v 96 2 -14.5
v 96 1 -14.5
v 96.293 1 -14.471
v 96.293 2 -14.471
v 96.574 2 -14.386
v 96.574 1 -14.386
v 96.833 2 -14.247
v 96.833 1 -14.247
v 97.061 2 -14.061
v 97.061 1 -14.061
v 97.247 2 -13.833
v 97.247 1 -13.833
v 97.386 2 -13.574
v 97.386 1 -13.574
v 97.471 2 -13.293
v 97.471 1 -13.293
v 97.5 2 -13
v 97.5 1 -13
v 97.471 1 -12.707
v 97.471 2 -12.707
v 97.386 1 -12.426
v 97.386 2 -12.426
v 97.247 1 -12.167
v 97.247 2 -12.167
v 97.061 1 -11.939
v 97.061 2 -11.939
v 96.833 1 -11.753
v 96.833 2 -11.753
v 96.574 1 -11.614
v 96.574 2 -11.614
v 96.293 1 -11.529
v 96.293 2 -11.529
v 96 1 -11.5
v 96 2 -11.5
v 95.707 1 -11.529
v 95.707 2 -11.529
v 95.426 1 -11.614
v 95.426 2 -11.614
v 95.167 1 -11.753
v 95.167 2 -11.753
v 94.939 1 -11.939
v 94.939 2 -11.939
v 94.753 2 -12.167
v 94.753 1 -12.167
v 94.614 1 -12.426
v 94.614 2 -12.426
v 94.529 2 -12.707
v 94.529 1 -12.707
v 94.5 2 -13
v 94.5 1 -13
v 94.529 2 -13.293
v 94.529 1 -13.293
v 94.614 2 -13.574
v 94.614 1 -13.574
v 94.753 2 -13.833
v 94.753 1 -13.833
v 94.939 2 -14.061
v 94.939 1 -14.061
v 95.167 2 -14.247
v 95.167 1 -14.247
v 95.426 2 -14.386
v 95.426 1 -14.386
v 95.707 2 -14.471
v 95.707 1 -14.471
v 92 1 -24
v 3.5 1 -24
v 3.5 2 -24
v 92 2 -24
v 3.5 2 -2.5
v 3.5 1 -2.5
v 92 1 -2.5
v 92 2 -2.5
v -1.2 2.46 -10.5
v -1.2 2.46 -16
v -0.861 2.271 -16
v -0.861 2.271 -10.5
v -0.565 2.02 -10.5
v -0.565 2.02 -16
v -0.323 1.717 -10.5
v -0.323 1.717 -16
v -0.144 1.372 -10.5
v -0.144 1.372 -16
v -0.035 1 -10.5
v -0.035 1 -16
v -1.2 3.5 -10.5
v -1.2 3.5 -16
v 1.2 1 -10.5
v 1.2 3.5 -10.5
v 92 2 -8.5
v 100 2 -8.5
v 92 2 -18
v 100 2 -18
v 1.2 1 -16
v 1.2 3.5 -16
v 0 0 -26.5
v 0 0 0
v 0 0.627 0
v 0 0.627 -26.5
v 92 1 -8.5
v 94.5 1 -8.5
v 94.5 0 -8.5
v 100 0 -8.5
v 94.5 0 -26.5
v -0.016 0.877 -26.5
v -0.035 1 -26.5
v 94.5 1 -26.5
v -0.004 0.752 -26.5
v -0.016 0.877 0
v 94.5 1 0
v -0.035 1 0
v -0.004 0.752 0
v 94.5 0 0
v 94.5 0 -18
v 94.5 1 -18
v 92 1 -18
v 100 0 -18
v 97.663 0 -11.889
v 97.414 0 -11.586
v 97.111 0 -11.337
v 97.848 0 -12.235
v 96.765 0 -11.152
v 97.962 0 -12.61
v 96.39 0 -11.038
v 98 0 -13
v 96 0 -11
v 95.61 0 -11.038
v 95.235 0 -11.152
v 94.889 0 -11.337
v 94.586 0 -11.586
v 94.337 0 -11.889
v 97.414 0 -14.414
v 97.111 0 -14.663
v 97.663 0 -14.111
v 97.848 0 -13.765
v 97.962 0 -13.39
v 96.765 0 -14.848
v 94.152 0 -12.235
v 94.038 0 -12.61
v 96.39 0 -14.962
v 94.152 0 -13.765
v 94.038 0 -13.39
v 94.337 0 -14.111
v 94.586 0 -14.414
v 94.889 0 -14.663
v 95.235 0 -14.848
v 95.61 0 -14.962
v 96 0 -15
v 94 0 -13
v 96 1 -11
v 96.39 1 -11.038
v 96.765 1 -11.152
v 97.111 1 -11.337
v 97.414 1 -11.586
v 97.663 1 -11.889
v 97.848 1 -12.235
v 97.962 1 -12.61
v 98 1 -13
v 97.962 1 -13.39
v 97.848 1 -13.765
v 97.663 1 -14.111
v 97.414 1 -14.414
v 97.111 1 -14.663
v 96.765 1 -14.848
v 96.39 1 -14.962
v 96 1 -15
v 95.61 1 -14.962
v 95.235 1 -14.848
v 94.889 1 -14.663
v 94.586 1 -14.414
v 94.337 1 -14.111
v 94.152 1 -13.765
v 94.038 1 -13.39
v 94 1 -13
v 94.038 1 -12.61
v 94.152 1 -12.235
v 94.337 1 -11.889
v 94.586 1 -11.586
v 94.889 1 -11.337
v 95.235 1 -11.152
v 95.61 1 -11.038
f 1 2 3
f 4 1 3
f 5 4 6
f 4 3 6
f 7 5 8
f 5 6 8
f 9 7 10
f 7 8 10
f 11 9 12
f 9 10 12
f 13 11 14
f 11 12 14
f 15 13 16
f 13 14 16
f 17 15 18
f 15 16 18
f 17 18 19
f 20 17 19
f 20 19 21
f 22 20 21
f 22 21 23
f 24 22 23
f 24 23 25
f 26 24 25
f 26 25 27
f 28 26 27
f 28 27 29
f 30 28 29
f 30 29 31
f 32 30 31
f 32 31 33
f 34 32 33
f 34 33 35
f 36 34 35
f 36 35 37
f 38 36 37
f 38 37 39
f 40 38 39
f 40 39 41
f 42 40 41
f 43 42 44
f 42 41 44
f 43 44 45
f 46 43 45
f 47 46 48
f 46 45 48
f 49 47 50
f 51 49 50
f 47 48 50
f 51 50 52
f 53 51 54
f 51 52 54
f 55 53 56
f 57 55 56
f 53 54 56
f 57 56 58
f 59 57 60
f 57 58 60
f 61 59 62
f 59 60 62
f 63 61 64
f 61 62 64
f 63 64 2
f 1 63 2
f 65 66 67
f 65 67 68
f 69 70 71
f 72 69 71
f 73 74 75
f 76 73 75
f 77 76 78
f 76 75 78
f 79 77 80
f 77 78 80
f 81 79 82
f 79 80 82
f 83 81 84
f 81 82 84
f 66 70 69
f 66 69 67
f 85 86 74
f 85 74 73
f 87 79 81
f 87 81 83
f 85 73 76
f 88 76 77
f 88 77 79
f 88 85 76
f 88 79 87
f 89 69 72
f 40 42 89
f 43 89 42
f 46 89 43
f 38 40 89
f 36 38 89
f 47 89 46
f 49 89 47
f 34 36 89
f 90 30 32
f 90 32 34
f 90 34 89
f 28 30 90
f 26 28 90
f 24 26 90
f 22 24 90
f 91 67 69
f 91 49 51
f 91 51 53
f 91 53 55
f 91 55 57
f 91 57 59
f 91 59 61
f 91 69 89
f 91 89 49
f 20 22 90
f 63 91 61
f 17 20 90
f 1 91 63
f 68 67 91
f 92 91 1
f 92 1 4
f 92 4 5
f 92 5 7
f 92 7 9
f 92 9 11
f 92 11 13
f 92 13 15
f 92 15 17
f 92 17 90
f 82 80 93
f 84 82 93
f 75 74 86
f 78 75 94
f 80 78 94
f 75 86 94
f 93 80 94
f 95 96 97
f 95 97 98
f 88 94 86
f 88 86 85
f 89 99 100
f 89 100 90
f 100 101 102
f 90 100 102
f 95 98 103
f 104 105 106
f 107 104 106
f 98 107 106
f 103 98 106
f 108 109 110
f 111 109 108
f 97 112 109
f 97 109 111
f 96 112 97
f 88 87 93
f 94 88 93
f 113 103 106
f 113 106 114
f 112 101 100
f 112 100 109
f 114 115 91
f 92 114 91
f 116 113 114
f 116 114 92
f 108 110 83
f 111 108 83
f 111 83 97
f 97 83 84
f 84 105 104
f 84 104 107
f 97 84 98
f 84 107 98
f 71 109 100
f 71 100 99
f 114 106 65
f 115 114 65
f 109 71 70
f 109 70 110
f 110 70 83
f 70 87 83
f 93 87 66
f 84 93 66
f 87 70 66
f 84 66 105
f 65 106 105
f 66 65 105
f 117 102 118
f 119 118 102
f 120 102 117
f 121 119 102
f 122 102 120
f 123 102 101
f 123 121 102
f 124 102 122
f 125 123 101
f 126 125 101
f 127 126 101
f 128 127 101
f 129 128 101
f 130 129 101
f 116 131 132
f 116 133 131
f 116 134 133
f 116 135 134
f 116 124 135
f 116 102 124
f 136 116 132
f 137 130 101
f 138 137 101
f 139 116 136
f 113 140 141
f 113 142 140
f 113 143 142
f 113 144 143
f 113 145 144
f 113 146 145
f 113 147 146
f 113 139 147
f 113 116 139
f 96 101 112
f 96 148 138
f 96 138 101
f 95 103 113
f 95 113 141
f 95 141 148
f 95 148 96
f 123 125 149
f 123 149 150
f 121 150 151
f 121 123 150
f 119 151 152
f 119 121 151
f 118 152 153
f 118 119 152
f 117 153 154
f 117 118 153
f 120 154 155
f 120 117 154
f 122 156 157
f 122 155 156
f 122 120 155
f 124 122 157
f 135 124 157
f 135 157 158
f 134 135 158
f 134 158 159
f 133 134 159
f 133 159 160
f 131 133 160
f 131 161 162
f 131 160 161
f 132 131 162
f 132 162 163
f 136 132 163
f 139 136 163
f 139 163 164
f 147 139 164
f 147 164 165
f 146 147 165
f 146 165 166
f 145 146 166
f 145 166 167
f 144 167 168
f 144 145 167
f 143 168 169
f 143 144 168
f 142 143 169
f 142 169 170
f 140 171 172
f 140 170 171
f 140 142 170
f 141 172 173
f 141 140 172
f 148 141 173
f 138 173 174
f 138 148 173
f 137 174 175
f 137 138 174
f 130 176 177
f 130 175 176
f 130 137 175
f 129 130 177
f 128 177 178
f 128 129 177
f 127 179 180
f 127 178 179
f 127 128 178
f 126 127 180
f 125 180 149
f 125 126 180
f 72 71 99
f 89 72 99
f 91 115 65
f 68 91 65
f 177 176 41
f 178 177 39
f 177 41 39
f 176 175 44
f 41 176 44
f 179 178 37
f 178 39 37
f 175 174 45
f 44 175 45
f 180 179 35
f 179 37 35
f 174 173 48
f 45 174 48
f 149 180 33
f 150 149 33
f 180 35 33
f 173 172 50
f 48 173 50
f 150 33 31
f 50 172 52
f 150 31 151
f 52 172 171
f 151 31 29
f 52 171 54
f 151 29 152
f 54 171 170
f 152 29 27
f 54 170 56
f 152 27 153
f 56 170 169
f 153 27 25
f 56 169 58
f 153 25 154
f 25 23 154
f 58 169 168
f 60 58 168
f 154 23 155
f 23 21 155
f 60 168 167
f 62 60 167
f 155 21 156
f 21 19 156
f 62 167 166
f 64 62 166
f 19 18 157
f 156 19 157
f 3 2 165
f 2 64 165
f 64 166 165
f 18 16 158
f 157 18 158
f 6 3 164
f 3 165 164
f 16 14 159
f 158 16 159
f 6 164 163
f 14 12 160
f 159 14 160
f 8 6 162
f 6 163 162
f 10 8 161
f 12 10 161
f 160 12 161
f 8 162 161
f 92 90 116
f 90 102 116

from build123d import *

# Parameters (mm, degrees)
BOSS_EXTRUDE1_DEPTH     = 1
CUT_EXTRUDE3_DEPTH      = 104.456512603
CUT_EXTRUDE3_DEPTH_BACK = 104.456512603
SKETCH6_R               = 2
SKETCH2_W               = 88.5
SKETCH2_H               = 21.5
BOSS_EXTRUDE2_DEPTH     = 1
SKETCH3_W               = 1.2
SKETCH3_H               = 5.5
BOSS_EXTRUDE3_DEPTH     = 2.5
SKETCH7_W               = 8
SKETCH7_H               = 9.5
BOSS_EXTRUDE4_DEPTH     = 1
SKETCH8_R               = 1.5
CUT_EXTRUDE4_DEPTH      = 3
SKETCH9_W               = 5.5
SKETCH9_H               = 1.039758998
BOSS_EXTRUDE5_DEPTH     = 1.2
FILLET3_START           = -16
FILLET3_DEPTH           = 5.5
FILLET3_START_2         = -26.5
FILLET3_2_DEPTH         = 26.5


with BuildPart() as part:
    # Sketch1 → Boss-Extrude1 (new body)
    with BuildSketch(Plane(origin=(0, 0, 0), x_dir=(1, 0, 0), z_dir=(0, 1, 0))):
        Polygon((94.5, 18), (100, 18), (100, 8.5), (94.5, 8.5), (94.5, 0), (0, 0), (0, 26.5), (94.5, 26.5), align=None)
    extrude(amount=BOSS_EXTRUDE1_DEPTH)

    # Sketch6 → Cut-Extrude3 (cut, two sides: drawn at the far end of the back side and taken through both)
    with BuildSketch(Plane(origin=(0, 1, 0), x_dir=(1, 0, 0), z_dir=(0, 1, 0)).offset(-CUT_EXTRUDE3_DEPTH_BACK)):
        with Locations(Location((96, 13, 0), (0, 0, 270))):
            Circle(SKETCH6_R)
    extrude(amount=CUT_EXTRUDE3_DEPTH + CUT_EXTRUDE3_DEPTH_BACK, mode=Mode.SUBTRACT)

    # Sketch2 → Boss-Extrude2 (add)
    with BuildSketch(Plane(origin=(0, 1, 0), x_dir=(1, 0, 0), z_dir=(0, 1, 0))):
        with Locations((47.75, 13.25)):
            Rectangle(SKETCH2_W, SKETCH2_H)
    extrude(amount=BOSS_EXTRUDE2_DEPTH)

    # Sketch3 → Boss-Extrude3 (add)
    with BuildSketch(Plane(origin=(0, 1, 0), x_dir=(1, 0, 0), z_dir=(0, 1, 0))):
        with Locations((0.6, 13.25)):
            Rectangle(SKETCH3_W, SKETCH3_H)
    extrude(amount=BOSS_EXTRUDE3_DEPTH)

    # Sketch7 → Boss-Extrude4 (add)
    with BuildSketch(Plane(origin=(0, 1, 0), x_dir=(1, 0, 0), z_dir=(0, 1, 0))):
        with Locations((96, 13.25)):
            Rectangle(SKETCH7_W, SKETCH7_H)
    extrude(amount=BOSS_EXTRUDE4_DEPTH)

    # Sketch8 → Cut-Extrude4 (cut)
    with BuildSketch(Plane.XZ.offset(-1)):
        with Locations(Location((96, -13, 0), (0, 0, 270))):
            Circle(SKETCH8_R)
    extrude(amount=-CUT_EXTRUDE4_DEPTH, mode=Mode.SUBTRACT)

    # Sketch9 → Boss-Extrude5 (add)
    with BuildSketch(Plane.ZY):
        with Locations((-13.25, 2.980120501)):
            Rectangle(SKETCH9_W, SKETCH9_H)
    extrude(amount=BOSS_EXTRUDE5_DEPTH)

    # Fillet3: read off the stored shape, not the designer's step
    # Fillet3 outline → Fillet3 (add)
    with BuildSketch(Plane.XY.offset(FILLET3_START)):
        with BuildLine():
            Line((0, 0.627210724), (0, 2.460241002))
            Line((0, 2.460241002), (-1.2, 2.460241002))
            ThreePointArc((-1.2, 2.460241002), (-0.326679947, 1.722655839), (0, 0.627210724))
        make_face()
    extrude(amount=FILLET3_DEPTH)

    # Fillet3 2 outline → Fillet3 2 (add)
    with BuildSketch(Plane.XY.offset(FILLET3_START_2)):
        with BuildLine():
            ThreePointArc((-0.035050088, 1), (-0.008781802, 0.814427412), (0, 0.627210724))
            Line((0, 0.627210724), (0, 1))
            Line((0, 1), (-0.035050088, 1))
        make_face()
    extrude(amount=FILLET3_2_DEPTH)


solid = part.part
